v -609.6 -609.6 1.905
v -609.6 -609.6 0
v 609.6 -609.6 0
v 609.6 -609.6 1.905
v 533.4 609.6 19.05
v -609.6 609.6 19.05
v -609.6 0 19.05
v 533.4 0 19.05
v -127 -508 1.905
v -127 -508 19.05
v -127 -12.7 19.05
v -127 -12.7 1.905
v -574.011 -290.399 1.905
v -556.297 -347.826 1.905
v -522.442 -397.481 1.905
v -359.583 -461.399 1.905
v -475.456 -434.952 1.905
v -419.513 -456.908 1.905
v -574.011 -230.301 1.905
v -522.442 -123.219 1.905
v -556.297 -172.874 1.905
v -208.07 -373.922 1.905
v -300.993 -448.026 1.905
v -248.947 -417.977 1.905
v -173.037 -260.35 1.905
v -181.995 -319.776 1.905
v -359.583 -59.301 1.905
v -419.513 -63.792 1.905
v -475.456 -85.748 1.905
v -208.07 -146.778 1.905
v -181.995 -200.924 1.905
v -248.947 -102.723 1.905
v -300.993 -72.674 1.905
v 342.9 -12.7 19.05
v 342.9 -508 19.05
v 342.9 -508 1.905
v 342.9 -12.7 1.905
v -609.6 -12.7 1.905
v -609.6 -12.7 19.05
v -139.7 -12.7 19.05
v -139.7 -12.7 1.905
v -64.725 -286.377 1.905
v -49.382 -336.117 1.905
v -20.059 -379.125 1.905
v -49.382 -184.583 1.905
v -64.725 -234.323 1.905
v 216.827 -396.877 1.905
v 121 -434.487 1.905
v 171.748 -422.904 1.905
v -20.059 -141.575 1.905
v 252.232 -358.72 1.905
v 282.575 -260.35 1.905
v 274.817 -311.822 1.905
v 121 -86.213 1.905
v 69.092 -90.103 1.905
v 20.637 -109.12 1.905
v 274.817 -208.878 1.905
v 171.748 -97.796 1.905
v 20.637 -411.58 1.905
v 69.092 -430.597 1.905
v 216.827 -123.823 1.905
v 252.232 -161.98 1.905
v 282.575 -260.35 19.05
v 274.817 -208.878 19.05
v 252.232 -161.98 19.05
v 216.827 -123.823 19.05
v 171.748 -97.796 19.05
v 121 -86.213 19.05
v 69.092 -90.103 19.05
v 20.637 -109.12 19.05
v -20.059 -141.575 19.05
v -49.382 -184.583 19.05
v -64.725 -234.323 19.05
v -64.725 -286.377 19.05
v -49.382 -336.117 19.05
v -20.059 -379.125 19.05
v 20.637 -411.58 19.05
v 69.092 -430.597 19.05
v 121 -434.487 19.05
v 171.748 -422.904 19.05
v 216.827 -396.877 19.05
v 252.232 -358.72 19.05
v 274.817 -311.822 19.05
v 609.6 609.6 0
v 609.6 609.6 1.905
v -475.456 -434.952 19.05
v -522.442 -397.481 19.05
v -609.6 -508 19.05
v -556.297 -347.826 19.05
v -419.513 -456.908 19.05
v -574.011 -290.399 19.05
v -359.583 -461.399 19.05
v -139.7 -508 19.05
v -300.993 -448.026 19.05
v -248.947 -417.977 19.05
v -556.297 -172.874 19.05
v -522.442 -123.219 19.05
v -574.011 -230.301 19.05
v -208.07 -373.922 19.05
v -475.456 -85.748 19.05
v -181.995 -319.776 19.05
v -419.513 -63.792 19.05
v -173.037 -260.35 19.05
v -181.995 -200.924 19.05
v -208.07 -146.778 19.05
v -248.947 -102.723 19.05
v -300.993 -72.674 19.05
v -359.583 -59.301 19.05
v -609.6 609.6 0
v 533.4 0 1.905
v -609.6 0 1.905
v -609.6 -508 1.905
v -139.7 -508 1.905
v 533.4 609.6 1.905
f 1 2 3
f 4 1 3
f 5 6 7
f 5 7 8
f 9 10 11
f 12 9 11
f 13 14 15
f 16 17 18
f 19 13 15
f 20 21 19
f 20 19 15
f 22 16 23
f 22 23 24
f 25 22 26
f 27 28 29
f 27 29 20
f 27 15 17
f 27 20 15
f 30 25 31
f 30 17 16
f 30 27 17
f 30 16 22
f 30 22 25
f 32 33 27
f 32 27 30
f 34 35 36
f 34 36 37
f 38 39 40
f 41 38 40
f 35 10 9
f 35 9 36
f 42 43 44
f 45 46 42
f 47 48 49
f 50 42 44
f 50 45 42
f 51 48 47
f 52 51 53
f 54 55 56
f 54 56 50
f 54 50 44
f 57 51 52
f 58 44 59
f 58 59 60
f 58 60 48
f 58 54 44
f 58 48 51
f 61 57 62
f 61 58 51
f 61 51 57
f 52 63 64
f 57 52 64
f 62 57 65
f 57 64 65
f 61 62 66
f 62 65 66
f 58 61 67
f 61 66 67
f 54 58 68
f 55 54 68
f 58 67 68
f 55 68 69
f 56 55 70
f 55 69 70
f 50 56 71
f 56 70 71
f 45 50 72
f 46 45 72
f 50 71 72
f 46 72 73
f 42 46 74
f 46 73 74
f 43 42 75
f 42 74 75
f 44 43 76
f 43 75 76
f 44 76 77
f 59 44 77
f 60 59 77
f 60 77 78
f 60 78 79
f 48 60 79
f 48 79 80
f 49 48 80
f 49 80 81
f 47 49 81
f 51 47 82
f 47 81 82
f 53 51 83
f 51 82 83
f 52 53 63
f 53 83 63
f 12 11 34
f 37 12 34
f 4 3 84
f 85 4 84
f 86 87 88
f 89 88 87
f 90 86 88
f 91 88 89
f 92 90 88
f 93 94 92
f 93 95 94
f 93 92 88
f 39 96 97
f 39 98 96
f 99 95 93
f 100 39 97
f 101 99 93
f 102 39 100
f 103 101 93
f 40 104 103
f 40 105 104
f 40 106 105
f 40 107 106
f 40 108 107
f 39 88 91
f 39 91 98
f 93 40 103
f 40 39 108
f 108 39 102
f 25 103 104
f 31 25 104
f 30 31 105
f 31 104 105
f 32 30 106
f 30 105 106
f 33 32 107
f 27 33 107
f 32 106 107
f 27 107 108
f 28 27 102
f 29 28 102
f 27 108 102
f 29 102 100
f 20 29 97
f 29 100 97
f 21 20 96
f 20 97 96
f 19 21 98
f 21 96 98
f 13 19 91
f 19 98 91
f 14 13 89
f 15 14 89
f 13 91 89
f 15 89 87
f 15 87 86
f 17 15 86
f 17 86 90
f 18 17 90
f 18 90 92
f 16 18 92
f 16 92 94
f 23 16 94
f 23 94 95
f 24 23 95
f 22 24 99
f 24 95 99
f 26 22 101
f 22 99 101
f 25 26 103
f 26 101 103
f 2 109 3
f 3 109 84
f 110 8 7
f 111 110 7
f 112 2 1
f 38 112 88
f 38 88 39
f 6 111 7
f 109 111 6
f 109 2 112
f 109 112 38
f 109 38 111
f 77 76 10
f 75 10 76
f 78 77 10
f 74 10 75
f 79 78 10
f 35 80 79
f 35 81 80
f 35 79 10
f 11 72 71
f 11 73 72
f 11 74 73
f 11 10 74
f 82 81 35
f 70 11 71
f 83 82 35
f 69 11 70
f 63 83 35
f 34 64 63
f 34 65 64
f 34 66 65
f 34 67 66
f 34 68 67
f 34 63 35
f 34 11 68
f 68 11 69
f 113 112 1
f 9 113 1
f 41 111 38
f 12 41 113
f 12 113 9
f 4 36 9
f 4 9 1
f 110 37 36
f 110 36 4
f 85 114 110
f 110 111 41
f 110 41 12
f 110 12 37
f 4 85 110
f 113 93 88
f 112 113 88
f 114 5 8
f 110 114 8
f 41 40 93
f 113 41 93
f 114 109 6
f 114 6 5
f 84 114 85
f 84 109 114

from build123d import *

# Parameters (mm, degrees)
F0_W     = 1219.2
F0_H     = 1219.2
F1_DEPTH = 19.05
F2_W     = 469.9
F2_H     = 495.3
F3_DEPTH = 17.145
F4_R     = 201.6125
F5_DEPTH = 17.145
F6_R     = 174.625
F7_DEPTH = 17.145


with BuildPart() as f1:
    # F0 (on Top) → F1 (new body)
    with BuildSketch(Plane.XY):
        Rectangle(F0_W, F0_H)
    extrude(amount=F1_DEPTH)

    # F2 (on face) → F3 (cut)
    with BuildSketch(Plane.XY.offset(19.05)):
        Polygon((609.6, 609.6), (533.4, 609.6), (533.4, 0), (-609.6, 0), (-609.6, -12.7), (-139.7, -12.7), (-139.7, -508), (-609.6, -508), (-609.6, -609.6), (609.6, -609.6), align=None)
        with Locations((107.95, -260.35)):
            Rectangle(F2_W, F2_H, mode=Mode.SUBTRACT)
    extrude(amount=-F3_DEPTH, mode=Mode.SUBTRACT)

    # F4 (on face) → F5 (cut)
    with BuildSketch(Plane.XY.offset(19.05)):
        with Locations((-374.65, -260.35)):
            Circle(F4_R)
    extrude(amount=-F5_DEPTH, mode=Mode.SUBTRACT)

    # F6 (on face) → F7 (cut)
    with BuildSketch(Plane.XY.offset(19.05)):
        with Locations((107.95, -260.35)):
            Circle(F6_R)
    extrude(amount=-F7_DEPTH, mode=Mode.SUBTRACT)


solid = f1.part
